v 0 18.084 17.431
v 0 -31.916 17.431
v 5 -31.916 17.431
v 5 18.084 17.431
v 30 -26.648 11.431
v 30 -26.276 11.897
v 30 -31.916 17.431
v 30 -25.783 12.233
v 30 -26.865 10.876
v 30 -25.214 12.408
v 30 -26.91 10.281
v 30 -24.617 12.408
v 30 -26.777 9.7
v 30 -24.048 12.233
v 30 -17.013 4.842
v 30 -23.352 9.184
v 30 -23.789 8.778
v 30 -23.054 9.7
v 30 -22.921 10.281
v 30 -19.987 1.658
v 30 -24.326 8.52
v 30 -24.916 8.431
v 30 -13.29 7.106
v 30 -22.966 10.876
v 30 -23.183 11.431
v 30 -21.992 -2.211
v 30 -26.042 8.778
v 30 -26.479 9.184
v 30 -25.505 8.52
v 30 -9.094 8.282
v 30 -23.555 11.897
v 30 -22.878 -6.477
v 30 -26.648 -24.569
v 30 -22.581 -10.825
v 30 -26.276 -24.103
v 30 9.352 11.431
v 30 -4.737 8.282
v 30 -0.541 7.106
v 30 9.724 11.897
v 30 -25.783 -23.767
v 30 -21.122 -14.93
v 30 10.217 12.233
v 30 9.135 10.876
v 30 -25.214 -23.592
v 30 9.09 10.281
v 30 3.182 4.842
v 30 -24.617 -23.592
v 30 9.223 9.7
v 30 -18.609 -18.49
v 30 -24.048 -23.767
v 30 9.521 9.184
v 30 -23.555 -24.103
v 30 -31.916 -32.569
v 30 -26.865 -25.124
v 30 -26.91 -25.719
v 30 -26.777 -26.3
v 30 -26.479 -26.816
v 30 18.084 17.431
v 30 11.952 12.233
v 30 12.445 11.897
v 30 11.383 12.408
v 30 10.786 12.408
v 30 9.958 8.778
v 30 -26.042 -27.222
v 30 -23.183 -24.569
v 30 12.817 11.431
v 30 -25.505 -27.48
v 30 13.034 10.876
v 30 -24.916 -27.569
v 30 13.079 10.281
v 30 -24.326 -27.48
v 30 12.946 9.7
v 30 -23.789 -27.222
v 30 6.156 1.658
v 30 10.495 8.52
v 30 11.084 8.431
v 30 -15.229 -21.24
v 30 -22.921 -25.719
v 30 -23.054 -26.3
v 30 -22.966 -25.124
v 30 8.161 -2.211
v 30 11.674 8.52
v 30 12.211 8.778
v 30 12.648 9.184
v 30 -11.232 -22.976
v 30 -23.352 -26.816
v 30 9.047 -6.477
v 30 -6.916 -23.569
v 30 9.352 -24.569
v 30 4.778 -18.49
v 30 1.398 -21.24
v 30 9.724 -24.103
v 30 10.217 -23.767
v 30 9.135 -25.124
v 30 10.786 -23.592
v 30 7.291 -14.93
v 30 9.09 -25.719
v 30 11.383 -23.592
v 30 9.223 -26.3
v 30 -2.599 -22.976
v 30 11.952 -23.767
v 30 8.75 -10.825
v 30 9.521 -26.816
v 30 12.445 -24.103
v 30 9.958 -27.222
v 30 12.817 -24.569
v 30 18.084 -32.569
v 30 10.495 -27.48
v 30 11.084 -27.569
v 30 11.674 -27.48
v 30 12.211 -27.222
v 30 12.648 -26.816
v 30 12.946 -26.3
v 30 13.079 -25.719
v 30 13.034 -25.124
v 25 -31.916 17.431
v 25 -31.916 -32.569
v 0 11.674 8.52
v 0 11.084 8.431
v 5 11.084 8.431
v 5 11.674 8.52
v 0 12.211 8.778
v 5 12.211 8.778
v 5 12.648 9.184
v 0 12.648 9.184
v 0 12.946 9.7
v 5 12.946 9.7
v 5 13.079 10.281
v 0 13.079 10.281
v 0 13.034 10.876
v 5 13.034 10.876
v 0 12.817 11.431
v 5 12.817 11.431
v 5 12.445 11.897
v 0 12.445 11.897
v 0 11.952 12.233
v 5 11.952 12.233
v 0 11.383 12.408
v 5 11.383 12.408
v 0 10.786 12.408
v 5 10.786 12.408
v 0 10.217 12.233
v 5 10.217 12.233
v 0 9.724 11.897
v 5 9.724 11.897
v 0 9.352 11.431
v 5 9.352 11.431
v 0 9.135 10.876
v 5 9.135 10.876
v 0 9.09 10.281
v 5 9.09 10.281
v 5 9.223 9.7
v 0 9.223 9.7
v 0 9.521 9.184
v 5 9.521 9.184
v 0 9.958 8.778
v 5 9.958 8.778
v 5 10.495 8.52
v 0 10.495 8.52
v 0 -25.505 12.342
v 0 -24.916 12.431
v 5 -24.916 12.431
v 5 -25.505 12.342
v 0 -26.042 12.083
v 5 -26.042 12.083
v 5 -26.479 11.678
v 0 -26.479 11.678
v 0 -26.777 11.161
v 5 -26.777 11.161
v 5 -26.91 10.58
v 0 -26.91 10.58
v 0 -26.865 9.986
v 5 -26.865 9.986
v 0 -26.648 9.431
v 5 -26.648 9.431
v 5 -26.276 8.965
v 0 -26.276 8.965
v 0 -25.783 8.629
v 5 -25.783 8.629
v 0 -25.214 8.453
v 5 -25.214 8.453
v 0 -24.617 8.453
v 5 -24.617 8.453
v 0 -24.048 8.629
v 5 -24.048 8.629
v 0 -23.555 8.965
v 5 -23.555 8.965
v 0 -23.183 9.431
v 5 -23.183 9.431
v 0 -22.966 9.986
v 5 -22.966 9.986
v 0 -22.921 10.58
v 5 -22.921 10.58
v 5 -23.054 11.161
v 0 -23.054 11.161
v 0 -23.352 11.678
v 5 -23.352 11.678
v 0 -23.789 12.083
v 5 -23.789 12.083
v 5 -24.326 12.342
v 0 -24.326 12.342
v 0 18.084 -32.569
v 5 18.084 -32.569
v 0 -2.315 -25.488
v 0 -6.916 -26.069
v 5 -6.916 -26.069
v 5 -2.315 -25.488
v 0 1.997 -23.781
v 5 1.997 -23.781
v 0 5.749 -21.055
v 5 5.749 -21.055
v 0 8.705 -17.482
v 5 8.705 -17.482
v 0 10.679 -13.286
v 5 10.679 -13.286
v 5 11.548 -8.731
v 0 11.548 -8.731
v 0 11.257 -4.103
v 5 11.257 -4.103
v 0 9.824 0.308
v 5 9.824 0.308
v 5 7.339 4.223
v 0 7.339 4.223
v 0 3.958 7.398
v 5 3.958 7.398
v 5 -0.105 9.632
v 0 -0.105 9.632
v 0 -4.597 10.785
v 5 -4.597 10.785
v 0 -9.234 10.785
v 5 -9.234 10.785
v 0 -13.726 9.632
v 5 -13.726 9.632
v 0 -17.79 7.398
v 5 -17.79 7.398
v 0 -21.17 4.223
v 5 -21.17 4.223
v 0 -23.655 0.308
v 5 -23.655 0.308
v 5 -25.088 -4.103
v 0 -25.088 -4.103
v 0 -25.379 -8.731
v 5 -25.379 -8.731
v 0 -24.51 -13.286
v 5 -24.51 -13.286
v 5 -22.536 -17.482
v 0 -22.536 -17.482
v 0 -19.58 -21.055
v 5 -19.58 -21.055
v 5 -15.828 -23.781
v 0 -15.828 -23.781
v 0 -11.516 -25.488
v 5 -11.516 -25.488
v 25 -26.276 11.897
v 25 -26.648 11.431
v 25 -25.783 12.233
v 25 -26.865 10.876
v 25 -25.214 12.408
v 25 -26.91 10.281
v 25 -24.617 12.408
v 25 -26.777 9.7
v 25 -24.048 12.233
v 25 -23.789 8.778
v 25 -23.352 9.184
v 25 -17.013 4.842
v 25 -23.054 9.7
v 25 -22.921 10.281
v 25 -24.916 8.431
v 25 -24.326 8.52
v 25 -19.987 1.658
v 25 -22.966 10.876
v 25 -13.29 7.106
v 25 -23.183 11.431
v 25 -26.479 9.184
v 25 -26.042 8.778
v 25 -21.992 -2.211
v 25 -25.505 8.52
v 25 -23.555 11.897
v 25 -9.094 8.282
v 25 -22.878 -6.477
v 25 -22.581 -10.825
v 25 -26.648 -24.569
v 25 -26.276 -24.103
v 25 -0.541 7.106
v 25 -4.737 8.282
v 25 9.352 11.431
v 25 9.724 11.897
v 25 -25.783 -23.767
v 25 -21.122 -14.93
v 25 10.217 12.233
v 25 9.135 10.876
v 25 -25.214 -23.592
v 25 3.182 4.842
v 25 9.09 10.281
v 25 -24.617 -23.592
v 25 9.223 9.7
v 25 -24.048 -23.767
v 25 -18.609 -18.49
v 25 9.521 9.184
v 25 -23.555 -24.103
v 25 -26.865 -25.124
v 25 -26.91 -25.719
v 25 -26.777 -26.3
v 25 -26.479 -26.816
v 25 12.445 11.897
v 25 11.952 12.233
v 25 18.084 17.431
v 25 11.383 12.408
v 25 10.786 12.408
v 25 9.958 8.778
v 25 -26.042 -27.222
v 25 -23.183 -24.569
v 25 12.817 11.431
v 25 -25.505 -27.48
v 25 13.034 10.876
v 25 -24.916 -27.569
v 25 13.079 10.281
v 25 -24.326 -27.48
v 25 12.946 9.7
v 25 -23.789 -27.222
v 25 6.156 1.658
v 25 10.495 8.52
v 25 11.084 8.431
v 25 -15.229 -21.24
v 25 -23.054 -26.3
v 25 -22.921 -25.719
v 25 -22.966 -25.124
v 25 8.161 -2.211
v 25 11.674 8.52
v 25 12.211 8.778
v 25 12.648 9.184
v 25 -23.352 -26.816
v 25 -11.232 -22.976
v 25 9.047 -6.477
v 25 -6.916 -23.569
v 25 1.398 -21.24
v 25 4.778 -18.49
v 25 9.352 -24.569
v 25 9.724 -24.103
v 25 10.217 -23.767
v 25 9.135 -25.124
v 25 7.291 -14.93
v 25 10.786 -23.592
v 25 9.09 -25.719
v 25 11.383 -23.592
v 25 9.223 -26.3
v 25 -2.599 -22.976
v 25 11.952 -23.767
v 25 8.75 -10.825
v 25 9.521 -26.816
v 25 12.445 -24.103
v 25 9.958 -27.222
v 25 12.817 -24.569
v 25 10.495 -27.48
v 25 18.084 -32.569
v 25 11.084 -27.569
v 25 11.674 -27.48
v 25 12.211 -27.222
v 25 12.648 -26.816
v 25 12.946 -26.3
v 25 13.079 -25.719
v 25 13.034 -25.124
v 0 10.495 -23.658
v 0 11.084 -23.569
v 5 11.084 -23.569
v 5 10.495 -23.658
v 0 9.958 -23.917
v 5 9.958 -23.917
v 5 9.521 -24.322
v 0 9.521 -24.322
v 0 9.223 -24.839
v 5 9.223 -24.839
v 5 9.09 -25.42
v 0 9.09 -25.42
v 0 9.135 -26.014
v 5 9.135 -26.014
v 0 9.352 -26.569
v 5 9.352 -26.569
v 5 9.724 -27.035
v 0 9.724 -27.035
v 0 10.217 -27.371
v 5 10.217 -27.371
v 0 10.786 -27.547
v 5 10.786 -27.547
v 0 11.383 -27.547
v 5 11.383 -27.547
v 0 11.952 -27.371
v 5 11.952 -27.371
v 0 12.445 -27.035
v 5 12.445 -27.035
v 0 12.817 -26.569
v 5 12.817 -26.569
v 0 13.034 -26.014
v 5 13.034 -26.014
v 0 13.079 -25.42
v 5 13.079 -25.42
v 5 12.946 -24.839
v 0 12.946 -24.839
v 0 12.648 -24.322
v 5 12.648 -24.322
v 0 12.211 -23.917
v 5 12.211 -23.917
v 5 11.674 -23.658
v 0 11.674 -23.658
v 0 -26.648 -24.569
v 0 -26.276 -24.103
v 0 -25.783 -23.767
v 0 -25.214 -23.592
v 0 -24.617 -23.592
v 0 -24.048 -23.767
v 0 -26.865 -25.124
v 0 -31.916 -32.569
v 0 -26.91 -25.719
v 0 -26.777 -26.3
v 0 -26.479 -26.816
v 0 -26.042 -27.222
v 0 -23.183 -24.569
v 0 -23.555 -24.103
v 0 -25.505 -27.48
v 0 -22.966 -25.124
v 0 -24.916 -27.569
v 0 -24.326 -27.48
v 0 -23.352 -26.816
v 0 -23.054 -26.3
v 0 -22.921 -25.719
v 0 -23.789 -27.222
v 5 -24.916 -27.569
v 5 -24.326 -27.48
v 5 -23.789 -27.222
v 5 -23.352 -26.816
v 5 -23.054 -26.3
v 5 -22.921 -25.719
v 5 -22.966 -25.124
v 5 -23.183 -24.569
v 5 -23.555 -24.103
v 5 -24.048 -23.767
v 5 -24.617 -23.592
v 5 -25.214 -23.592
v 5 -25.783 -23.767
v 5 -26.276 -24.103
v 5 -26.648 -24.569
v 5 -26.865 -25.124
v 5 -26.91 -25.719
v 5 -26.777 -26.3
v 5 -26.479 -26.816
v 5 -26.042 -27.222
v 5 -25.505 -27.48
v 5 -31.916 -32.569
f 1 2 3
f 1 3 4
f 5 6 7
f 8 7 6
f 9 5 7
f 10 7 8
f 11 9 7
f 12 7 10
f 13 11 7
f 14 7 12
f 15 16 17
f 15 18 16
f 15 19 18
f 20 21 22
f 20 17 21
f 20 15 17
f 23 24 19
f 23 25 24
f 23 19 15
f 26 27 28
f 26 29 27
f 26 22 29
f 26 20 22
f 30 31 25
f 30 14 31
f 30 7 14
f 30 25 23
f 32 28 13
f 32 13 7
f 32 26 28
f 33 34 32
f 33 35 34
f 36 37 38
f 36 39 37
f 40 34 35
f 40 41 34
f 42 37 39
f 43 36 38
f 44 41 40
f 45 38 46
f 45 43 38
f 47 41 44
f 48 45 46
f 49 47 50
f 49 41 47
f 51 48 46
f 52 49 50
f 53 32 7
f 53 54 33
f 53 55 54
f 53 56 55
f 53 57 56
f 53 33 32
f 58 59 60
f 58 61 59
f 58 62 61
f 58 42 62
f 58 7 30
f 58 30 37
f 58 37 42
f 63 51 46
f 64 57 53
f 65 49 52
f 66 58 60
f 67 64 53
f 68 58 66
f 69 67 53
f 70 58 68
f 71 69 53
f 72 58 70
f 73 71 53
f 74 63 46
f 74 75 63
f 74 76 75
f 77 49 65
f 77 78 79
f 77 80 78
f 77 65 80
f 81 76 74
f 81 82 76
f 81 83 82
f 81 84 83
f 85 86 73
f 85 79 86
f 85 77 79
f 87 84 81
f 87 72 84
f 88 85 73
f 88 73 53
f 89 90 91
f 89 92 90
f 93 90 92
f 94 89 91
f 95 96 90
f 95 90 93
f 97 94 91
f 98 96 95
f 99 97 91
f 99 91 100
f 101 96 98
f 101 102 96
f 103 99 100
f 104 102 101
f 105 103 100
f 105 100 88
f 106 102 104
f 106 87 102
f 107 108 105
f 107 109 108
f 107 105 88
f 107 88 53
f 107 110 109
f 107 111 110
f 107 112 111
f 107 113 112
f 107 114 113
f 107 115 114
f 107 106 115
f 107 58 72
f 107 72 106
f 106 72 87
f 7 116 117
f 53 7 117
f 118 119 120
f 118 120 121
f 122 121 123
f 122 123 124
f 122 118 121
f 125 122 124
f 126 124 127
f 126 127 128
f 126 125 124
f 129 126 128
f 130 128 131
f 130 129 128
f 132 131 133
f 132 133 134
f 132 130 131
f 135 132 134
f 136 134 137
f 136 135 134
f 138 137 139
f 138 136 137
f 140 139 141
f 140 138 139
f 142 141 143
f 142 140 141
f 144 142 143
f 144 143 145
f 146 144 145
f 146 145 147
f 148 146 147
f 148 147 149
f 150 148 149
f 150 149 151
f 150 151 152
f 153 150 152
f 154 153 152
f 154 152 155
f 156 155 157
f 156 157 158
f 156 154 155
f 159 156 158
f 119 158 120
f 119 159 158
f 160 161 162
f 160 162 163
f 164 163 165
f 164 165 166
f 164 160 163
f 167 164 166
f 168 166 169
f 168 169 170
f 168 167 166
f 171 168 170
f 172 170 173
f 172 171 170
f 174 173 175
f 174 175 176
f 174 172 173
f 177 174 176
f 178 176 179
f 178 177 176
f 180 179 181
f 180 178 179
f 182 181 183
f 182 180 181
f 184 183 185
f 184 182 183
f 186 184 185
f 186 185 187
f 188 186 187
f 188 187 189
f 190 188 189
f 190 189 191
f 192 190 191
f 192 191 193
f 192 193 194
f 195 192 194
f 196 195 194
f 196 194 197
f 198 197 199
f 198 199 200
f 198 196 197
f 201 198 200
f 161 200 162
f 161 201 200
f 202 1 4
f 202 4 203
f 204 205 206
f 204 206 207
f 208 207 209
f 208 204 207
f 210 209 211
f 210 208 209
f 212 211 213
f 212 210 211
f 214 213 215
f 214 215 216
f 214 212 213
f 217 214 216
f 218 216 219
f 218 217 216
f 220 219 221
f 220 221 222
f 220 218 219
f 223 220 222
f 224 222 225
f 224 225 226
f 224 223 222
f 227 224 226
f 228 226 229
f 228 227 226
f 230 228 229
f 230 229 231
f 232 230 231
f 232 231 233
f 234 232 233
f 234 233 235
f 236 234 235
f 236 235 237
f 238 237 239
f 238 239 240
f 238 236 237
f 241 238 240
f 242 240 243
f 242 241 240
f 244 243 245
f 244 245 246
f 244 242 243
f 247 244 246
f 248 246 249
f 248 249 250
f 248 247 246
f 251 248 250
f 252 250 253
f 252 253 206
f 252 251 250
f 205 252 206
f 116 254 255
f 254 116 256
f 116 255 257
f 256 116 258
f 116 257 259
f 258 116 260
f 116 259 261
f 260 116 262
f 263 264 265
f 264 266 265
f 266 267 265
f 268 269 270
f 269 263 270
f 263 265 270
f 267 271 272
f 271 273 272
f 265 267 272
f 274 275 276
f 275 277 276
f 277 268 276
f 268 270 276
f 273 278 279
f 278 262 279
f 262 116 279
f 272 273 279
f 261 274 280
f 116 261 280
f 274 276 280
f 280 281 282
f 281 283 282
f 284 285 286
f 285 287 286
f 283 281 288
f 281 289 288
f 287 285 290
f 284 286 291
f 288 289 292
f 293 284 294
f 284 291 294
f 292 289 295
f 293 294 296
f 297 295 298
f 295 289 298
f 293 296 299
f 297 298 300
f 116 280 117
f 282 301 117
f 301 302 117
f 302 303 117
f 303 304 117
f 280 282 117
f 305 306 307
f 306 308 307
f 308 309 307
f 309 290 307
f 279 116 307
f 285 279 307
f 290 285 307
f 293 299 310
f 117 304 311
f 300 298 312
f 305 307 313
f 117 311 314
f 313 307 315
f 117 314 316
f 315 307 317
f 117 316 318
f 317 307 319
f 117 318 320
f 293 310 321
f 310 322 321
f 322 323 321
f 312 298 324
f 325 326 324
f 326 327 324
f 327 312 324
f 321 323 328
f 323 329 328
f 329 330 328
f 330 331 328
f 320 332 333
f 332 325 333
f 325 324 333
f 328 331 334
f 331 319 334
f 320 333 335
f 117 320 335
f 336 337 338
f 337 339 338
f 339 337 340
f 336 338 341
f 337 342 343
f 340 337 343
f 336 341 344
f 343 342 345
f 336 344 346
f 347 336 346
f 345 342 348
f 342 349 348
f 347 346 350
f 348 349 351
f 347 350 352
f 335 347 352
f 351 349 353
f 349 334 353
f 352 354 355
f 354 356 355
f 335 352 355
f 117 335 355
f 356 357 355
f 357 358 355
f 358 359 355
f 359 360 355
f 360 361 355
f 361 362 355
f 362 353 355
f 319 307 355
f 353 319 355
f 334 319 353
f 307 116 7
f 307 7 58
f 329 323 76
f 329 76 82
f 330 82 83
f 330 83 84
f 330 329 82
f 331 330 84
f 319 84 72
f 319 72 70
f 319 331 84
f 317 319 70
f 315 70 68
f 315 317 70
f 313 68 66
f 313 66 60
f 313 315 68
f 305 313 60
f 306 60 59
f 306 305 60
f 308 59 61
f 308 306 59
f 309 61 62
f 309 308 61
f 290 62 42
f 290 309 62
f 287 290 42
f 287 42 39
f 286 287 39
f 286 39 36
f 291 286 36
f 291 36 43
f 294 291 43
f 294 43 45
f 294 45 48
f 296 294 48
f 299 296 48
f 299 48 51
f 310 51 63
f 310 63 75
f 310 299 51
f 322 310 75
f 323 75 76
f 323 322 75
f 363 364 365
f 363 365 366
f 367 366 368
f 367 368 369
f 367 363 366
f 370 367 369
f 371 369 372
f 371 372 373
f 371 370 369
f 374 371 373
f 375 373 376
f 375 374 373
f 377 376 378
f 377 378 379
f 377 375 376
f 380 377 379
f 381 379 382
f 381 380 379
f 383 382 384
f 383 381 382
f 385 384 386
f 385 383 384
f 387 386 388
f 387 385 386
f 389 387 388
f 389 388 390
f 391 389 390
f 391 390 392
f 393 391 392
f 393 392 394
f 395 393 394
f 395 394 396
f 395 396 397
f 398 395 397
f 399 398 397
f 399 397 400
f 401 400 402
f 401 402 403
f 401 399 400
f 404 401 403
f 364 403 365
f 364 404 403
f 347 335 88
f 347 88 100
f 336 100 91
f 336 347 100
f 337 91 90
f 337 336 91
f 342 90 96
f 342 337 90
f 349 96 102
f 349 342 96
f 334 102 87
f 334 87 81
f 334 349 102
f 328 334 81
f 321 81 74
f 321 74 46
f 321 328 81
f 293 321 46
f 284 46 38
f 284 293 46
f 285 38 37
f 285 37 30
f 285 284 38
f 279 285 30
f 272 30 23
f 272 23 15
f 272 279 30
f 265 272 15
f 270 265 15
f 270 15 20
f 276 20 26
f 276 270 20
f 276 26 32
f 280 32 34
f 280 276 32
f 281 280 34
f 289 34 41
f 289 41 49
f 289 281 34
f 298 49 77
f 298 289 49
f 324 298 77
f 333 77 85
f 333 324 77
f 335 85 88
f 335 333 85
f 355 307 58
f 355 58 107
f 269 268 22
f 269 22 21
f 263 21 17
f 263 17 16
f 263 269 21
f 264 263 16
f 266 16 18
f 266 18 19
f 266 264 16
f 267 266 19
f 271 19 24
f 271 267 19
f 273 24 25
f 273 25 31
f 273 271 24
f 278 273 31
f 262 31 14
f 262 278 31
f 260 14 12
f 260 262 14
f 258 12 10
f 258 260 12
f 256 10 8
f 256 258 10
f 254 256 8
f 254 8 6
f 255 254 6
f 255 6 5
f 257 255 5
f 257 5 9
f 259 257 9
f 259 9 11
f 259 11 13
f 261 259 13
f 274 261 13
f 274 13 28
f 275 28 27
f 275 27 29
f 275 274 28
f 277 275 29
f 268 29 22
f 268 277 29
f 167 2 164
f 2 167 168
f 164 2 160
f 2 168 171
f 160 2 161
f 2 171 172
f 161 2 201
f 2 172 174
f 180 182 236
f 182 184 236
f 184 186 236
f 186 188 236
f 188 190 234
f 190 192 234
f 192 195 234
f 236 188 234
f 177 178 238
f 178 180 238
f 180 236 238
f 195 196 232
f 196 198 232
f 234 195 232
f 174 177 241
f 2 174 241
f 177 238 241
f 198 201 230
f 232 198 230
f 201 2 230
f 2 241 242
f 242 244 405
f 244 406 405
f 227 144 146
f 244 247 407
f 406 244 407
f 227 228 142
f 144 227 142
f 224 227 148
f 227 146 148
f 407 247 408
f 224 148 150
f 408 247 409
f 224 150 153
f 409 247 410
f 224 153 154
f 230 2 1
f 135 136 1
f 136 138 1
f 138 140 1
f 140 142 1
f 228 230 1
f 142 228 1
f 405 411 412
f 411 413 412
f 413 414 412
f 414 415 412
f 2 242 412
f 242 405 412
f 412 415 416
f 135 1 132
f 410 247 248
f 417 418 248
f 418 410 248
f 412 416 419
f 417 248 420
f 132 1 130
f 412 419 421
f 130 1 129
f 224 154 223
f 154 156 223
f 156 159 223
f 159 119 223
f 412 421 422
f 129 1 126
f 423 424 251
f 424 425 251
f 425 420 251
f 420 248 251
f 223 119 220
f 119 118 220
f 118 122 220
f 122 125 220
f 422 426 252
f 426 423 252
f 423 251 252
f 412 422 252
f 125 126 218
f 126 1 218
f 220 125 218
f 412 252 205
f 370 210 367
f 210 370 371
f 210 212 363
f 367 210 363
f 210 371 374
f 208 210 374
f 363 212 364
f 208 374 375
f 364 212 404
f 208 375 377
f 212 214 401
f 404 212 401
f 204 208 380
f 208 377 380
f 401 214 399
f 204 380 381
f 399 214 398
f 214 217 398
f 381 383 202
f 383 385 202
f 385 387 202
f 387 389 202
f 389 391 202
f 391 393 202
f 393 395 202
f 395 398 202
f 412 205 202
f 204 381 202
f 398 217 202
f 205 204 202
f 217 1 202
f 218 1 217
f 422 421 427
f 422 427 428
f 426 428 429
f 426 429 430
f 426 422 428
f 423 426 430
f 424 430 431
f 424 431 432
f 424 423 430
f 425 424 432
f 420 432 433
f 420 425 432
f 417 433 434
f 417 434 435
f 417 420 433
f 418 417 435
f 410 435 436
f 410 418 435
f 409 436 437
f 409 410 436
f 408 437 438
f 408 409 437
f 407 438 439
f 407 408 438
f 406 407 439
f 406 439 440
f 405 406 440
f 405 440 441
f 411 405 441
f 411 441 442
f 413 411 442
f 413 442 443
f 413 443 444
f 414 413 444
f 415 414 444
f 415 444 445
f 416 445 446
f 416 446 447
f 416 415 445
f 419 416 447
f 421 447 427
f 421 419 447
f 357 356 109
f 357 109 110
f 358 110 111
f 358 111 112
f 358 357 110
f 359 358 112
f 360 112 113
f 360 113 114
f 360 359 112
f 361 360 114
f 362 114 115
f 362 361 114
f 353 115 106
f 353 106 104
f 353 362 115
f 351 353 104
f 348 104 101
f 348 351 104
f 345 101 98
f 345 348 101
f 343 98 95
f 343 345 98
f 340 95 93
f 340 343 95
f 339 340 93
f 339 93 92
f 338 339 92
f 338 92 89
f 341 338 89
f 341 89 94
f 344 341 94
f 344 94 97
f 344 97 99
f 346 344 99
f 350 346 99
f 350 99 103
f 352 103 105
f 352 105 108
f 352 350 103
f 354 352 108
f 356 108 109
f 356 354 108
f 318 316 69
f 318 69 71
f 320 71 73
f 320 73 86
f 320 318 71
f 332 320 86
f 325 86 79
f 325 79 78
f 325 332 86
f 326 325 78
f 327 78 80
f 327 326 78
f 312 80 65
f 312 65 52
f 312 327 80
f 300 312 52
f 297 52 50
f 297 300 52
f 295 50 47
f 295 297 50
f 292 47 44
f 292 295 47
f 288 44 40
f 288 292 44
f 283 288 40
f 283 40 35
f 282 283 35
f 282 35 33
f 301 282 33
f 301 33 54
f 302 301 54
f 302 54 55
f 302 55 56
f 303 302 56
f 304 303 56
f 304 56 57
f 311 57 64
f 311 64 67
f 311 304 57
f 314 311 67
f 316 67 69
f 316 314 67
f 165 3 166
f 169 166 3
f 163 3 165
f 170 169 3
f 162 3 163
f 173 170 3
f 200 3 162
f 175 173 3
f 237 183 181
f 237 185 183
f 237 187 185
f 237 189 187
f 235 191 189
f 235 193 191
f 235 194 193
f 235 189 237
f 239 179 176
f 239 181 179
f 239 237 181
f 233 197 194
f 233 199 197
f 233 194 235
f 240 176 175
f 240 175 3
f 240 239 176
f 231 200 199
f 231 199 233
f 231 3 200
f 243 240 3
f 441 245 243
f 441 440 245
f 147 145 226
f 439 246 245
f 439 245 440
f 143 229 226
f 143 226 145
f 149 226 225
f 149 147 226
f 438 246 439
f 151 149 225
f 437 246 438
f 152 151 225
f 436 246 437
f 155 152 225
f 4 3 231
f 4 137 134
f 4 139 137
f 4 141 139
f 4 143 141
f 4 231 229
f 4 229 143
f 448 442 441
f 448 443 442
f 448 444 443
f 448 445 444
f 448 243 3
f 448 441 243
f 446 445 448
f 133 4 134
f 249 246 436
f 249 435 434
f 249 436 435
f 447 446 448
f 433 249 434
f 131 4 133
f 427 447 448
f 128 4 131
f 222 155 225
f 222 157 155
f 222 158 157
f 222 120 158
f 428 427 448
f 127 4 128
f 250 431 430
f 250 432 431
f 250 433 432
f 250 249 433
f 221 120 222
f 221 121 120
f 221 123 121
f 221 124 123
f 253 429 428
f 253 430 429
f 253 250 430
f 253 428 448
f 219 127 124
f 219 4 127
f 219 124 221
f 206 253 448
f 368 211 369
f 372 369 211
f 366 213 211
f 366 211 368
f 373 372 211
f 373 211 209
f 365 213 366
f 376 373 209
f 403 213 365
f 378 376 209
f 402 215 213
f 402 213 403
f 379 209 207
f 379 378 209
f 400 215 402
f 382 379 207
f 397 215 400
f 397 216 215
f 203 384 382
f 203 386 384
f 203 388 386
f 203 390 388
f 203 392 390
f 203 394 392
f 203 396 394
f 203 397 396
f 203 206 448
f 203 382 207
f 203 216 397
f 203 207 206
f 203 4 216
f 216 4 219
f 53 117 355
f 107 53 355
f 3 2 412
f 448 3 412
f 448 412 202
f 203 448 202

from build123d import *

# Parameters (mm, degrees)
SKETCH1_W           = 50
SKETCH1_H           = 50
SKETCH1_R           = 2
SKETCH1_R_2         = 18.5
BOSS_EXTRUDE1_DEPTH = 5
SKETCH4_W           = 50
SKETCH4_H           = 50
SKETCH4_R           = 2
SKETCH4_R_2         = 16
BOSS_EXTRUDE2_DEPTH = 5


with BuildPart() as part:
    # Sketch1 → Boss-Extrude1 (new body)
    with BuildSketch(Plane(origin=(0, 0, 0), x_dir=(0, 0, -1), z_dir=(1, 0, 0))):
        with Locations((7.569218273, -6.915532209)):
            Rectangle(SKETCH1_W, SKETCH1_H)
        with Locations((-10.430781727, 11.084467791)):
            Circle(SKETCH1_R, mode=Mode.SUBTRACT)
        with Locations(Location((-10.430781727, -24.915532209, 0), (0, 0, 180))):
            Circle(SKETCH1_R, mode=Mode.SUBTRACT)
        with Locations((25.569218273, -24.915532209)):
            Circle(SKETCH1_R, mode=Mode.SUBTRACT)
        with Locations(Location((25.569218273, 11.084467791, 0), (0, 0, 180))):
            Circle(SKETCH1_R, mode=Mode.SUBTRACT)
        with Locations((7.569218273, -6.915532209)):
            Circle(SKETCH1_R_2, mode=Mode.SUBTRACT)
    extrude(amount=BOSS_EXTRUDE1_DEPTH)


with BuildPart() as body_2:
    # Sketch4 → Boss-Extrude2 (new body)
    with BuildSketch(Plane(origin=(25, 0, 0), x_dir=(0, 0, -1), z_dir=(1, 0, 0))):
        with Locations((7.569218273, -6.915532209)):
            Rectangle(SKETCH4_W, SKETCH4_H)
        with Locations((-10.430781727, -24.915532209)):
            Circle(SKETCH4_R, mode=Mode.SUBTRACT)
        with Locations((-10.430781727, 11.084467791)):
            Circle(SKETCH4_R, mode=Mode.SUBTRACT)
        with Locations((25.569218273, 11.084467791)):
            Circle(SKETCH4_R, mode=Mode.SUBTRACT)
        with Locations((25.569218273, -24.915532209)):
            Circle(SKETCH4_R, mode=Mode.SUBTRACT)
        with Locations((7.569218273, -6.915532209)):
            Circle(SKETCH4_R_2, mode=Mode.SUBTRACT)
    extrude(amount=BOSS_EXTRUDE2_DEPTH)


solid = Compound([part.part, body_2.part])
